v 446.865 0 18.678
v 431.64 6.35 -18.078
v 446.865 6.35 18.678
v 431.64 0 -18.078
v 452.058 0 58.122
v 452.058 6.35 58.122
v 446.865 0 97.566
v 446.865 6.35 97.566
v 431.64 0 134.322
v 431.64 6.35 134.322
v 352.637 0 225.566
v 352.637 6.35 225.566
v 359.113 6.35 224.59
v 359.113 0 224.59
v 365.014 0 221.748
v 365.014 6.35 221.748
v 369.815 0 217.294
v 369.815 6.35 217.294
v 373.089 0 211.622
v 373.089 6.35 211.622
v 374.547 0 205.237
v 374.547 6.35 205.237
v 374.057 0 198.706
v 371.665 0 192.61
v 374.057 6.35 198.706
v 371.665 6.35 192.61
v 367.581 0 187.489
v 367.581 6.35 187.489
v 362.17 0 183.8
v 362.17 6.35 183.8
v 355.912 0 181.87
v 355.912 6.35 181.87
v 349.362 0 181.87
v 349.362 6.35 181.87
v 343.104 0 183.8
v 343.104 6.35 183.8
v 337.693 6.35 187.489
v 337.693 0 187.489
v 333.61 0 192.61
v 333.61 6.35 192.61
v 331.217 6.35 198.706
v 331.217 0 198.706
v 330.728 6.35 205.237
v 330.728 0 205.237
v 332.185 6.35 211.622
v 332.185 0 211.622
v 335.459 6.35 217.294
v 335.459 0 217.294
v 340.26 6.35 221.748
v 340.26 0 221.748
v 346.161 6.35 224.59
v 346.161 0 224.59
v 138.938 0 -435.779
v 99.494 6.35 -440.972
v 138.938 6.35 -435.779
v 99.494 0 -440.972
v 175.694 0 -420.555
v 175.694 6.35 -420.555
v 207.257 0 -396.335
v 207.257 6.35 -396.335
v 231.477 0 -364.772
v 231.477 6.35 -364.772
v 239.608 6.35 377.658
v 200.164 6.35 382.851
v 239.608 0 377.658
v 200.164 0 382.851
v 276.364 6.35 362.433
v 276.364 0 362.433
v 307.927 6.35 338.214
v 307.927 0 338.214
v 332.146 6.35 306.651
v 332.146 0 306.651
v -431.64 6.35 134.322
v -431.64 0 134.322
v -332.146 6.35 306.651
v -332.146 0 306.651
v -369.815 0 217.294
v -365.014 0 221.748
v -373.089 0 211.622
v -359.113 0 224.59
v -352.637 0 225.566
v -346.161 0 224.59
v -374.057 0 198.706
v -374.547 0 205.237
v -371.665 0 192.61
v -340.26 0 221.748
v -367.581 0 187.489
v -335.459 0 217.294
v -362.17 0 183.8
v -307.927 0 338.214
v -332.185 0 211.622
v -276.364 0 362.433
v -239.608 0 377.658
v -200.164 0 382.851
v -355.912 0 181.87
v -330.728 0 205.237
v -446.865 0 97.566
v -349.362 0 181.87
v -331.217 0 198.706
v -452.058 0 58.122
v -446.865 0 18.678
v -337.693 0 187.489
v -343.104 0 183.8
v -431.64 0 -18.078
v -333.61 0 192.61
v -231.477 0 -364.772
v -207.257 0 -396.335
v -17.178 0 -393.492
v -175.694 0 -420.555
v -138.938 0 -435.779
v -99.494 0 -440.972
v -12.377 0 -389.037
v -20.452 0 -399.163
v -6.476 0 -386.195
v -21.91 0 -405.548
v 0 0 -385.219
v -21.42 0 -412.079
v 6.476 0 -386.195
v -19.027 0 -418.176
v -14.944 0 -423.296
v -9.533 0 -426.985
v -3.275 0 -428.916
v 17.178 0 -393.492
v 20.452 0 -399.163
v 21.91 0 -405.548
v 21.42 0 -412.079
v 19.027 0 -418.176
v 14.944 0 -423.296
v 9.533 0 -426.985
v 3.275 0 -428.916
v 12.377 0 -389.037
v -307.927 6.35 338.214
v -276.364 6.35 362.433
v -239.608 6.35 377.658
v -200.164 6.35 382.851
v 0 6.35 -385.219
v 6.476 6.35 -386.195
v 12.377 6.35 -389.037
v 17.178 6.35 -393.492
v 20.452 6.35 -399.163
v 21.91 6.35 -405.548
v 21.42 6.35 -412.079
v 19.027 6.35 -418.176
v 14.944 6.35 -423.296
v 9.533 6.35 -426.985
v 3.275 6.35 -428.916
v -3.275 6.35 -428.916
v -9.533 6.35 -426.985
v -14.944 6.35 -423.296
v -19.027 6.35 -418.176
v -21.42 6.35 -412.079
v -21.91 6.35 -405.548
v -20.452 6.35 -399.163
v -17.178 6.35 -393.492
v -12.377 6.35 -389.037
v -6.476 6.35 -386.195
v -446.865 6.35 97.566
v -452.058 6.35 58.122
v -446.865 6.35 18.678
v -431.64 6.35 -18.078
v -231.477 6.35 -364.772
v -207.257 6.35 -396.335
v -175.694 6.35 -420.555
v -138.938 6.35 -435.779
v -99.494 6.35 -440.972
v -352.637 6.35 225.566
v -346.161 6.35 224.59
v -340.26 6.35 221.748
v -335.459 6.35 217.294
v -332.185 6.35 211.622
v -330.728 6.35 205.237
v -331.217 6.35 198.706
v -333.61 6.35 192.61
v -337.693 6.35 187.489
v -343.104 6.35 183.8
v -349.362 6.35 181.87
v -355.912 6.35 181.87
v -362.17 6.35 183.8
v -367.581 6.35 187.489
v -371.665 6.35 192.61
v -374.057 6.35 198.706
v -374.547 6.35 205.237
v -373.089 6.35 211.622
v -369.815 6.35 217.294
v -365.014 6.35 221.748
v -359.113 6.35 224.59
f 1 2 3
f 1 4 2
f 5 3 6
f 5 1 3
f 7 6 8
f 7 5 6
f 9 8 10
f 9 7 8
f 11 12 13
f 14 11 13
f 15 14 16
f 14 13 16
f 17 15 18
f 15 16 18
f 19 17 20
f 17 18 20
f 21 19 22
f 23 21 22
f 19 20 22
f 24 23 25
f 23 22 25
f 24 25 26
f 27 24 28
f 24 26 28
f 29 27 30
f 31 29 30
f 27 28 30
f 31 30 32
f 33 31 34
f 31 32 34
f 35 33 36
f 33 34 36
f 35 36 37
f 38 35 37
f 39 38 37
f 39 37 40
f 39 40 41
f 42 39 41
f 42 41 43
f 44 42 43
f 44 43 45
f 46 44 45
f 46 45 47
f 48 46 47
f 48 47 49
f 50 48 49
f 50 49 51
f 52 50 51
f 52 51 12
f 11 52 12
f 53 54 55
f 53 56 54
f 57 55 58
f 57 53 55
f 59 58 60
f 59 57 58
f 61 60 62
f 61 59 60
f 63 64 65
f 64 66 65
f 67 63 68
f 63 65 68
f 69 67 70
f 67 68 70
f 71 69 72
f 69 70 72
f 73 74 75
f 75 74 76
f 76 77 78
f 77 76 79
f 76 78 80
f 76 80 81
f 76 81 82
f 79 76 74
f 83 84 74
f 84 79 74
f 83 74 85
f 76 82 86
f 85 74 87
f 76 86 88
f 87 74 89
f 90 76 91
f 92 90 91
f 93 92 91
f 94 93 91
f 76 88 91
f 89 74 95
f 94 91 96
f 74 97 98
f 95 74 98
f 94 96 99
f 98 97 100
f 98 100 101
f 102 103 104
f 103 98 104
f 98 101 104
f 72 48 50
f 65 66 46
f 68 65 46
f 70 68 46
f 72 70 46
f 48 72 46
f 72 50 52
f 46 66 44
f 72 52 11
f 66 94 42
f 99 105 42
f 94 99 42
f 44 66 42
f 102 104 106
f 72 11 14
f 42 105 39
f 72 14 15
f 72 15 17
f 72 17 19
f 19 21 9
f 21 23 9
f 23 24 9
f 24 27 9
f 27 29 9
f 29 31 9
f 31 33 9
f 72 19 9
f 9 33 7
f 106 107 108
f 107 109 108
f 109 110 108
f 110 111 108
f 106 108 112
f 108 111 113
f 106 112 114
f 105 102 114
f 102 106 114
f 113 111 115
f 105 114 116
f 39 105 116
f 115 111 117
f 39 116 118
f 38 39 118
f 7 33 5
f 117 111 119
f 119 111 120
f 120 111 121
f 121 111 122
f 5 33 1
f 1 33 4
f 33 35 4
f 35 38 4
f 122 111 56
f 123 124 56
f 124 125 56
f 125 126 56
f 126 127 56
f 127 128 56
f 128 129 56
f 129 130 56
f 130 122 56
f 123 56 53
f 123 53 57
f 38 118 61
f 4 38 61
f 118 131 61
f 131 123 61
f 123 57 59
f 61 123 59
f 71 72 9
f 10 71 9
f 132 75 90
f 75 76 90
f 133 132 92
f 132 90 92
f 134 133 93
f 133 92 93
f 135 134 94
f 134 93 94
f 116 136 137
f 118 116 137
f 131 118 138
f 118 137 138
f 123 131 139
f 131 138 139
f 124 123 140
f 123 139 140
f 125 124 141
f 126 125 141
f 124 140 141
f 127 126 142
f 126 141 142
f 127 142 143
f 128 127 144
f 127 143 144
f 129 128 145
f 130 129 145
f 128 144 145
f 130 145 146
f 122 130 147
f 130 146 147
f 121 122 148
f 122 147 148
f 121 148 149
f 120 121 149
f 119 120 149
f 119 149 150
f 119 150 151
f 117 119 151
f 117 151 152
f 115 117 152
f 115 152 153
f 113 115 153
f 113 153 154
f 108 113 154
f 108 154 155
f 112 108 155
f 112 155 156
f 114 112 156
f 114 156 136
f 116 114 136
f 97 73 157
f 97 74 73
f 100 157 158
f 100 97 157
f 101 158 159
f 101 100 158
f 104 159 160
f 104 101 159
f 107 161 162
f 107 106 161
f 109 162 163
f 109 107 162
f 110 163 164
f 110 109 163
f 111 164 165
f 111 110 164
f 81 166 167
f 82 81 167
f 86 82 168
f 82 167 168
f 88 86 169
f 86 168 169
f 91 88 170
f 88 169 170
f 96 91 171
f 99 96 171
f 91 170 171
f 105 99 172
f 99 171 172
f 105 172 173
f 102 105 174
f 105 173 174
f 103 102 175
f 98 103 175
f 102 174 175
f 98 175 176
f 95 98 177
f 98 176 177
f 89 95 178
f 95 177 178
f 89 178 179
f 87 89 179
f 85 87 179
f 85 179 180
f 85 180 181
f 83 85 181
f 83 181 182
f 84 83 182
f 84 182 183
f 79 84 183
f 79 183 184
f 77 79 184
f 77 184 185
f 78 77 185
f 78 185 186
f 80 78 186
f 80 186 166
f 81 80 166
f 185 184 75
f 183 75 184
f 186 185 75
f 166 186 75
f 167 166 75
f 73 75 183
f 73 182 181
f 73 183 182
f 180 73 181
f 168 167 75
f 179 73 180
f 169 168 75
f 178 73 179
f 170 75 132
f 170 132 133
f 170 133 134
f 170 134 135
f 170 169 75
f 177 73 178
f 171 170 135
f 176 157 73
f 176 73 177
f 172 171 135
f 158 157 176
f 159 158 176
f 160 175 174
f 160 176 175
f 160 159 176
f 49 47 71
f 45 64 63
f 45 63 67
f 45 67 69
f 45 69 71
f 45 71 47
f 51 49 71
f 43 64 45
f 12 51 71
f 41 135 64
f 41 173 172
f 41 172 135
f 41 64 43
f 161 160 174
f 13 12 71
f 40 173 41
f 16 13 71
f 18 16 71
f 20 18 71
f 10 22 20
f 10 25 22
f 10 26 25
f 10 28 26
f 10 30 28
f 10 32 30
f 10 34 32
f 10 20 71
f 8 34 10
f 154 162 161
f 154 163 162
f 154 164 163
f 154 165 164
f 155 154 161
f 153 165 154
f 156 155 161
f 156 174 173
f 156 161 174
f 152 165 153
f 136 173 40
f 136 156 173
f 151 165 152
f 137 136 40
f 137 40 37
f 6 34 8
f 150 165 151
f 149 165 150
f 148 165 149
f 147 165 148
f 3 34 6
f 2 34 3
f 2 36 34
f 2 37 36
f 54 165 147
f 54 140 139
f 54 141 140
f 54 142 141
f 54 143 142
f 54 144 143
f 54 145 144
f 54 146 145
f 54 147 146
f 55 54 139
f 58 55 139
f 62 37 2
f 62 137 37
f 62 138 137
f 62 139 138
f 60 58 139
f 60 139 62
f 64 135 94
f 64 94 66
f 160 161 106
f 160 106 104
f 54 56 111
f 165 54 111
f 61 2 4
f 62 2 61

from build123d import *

# Parameters (mm, degrees)
SKETCH3_R           = 21.082
BOSS_EXTRUDE1_DEPTH = 6.35
CUT_EXTRUDE1_DEPTH  = 722.250266796
FILLET1_R           = 152.4
SKETCH5_R           = 21.971
CUT_EXTRUDE2_DEPTH  = 632.548321209


with BuildPart() as part:
    # Sketch3 → Boss-Extrude1 (new body)
    with BuildSketch(Plane(origin=(0, 0, 0), x_dir=(1, 0, 0), z_dir=(0, 1, 0))):
        Polygon((-534.293160191, 43.478424236), (-229.493160191, -484.450661911), (229.493160191, -484.450661911), (534.293160191, 43.478424236), (304.8, 440.972237675), (-304.8, 440.972237675), align=None)
        with Locations(Location((-352.63709, -203.595118838, 0), (0, 0, 270))):
            Circle(SKETCH3_R, mode=Mode.SUBTRACT)
        with Locations(Location((352.63709, -203.595118838, 0), (0, 0, 270))):
            Circle(SKETCH3_R, mode=Mode.SUBTRACT)
        with Locations(Location((0, 407.190237675, 0), (0, 0, 270))):
            Circle(SKETCH3_R, mode=Mode.SUBTRACT)
    extrude(amount=BOSS_EXTRUDE1_DEPTH)

    # Sketch4 → Cut-Extrude1 (cut, through all)
    with BuildSketch(Plane(origin=(0, 6.35, 0), x_dir=(1, 0, 0), z_dir=(0, 1, 0))):
        Polygon((-187.482425301, 440.972237675), (-475.634372841, -58.121575764), (-534.293160191, 43.478424236), (-304.8, 440.972237675), align=None)
        Polygon((304.8, 440.972237675), (534.293160191, 43.478424236), (475.634372841, -58.121575764), (187.482425301, 440.972237675), align=None)
        Polygon((229.493160191, -484.450661911), (-229.493160191, -484.450661911), (-288.15194754, -382.850661911), (288.15194754, -382.850661911), align=None)
    extrude(amount=-CUT_EXTRUDE1_DEPTH, mode=Mode.SUBTRACT)

    # Fillet1
    fillet1_edges = [part.edges().sort_by_distance(p)[0] for p in [
        (288.15194754, 3.175, 382.850661911),
        (-288.15194754, 3.175, 382.850661911),
        (187.482425301, 3.175, -440.972237675),
        (475.634372841, 3.175, 58.121575764),
        (-187.482425301, 3.175, -440.972237675),
        (-475.634372841, 3.175, 58.121575764),
    ]]
    fillet(fillet1_edges, radius=FILLET1_R)

    # Sketch5 → Cut-Extrude2 (cut, through all)
    with BuildSketch(Plane(origin=(0, 6.35, 0), x_dir=(1, 0, 0), z_dir=(0, 1, 0))):
        with Locations(Location((0, 407.190237675, 0), (0, 0, 270))):
            Circle(SKETCH5_R)
        with Locations(Location((352.63709, -203.595118838, 0), (0, 0, 270))):
            Circle(SKETCH5_R)
        with Locations(Location((-352.63709, -203.595118838, 0), (0, 0, 270))):
            Circle(SKETCH5_R)
    extrude(amount=-CUT_EXTRUDE2_DEPTH, mode=Mode.SUBTRACT)


solid = part.part
